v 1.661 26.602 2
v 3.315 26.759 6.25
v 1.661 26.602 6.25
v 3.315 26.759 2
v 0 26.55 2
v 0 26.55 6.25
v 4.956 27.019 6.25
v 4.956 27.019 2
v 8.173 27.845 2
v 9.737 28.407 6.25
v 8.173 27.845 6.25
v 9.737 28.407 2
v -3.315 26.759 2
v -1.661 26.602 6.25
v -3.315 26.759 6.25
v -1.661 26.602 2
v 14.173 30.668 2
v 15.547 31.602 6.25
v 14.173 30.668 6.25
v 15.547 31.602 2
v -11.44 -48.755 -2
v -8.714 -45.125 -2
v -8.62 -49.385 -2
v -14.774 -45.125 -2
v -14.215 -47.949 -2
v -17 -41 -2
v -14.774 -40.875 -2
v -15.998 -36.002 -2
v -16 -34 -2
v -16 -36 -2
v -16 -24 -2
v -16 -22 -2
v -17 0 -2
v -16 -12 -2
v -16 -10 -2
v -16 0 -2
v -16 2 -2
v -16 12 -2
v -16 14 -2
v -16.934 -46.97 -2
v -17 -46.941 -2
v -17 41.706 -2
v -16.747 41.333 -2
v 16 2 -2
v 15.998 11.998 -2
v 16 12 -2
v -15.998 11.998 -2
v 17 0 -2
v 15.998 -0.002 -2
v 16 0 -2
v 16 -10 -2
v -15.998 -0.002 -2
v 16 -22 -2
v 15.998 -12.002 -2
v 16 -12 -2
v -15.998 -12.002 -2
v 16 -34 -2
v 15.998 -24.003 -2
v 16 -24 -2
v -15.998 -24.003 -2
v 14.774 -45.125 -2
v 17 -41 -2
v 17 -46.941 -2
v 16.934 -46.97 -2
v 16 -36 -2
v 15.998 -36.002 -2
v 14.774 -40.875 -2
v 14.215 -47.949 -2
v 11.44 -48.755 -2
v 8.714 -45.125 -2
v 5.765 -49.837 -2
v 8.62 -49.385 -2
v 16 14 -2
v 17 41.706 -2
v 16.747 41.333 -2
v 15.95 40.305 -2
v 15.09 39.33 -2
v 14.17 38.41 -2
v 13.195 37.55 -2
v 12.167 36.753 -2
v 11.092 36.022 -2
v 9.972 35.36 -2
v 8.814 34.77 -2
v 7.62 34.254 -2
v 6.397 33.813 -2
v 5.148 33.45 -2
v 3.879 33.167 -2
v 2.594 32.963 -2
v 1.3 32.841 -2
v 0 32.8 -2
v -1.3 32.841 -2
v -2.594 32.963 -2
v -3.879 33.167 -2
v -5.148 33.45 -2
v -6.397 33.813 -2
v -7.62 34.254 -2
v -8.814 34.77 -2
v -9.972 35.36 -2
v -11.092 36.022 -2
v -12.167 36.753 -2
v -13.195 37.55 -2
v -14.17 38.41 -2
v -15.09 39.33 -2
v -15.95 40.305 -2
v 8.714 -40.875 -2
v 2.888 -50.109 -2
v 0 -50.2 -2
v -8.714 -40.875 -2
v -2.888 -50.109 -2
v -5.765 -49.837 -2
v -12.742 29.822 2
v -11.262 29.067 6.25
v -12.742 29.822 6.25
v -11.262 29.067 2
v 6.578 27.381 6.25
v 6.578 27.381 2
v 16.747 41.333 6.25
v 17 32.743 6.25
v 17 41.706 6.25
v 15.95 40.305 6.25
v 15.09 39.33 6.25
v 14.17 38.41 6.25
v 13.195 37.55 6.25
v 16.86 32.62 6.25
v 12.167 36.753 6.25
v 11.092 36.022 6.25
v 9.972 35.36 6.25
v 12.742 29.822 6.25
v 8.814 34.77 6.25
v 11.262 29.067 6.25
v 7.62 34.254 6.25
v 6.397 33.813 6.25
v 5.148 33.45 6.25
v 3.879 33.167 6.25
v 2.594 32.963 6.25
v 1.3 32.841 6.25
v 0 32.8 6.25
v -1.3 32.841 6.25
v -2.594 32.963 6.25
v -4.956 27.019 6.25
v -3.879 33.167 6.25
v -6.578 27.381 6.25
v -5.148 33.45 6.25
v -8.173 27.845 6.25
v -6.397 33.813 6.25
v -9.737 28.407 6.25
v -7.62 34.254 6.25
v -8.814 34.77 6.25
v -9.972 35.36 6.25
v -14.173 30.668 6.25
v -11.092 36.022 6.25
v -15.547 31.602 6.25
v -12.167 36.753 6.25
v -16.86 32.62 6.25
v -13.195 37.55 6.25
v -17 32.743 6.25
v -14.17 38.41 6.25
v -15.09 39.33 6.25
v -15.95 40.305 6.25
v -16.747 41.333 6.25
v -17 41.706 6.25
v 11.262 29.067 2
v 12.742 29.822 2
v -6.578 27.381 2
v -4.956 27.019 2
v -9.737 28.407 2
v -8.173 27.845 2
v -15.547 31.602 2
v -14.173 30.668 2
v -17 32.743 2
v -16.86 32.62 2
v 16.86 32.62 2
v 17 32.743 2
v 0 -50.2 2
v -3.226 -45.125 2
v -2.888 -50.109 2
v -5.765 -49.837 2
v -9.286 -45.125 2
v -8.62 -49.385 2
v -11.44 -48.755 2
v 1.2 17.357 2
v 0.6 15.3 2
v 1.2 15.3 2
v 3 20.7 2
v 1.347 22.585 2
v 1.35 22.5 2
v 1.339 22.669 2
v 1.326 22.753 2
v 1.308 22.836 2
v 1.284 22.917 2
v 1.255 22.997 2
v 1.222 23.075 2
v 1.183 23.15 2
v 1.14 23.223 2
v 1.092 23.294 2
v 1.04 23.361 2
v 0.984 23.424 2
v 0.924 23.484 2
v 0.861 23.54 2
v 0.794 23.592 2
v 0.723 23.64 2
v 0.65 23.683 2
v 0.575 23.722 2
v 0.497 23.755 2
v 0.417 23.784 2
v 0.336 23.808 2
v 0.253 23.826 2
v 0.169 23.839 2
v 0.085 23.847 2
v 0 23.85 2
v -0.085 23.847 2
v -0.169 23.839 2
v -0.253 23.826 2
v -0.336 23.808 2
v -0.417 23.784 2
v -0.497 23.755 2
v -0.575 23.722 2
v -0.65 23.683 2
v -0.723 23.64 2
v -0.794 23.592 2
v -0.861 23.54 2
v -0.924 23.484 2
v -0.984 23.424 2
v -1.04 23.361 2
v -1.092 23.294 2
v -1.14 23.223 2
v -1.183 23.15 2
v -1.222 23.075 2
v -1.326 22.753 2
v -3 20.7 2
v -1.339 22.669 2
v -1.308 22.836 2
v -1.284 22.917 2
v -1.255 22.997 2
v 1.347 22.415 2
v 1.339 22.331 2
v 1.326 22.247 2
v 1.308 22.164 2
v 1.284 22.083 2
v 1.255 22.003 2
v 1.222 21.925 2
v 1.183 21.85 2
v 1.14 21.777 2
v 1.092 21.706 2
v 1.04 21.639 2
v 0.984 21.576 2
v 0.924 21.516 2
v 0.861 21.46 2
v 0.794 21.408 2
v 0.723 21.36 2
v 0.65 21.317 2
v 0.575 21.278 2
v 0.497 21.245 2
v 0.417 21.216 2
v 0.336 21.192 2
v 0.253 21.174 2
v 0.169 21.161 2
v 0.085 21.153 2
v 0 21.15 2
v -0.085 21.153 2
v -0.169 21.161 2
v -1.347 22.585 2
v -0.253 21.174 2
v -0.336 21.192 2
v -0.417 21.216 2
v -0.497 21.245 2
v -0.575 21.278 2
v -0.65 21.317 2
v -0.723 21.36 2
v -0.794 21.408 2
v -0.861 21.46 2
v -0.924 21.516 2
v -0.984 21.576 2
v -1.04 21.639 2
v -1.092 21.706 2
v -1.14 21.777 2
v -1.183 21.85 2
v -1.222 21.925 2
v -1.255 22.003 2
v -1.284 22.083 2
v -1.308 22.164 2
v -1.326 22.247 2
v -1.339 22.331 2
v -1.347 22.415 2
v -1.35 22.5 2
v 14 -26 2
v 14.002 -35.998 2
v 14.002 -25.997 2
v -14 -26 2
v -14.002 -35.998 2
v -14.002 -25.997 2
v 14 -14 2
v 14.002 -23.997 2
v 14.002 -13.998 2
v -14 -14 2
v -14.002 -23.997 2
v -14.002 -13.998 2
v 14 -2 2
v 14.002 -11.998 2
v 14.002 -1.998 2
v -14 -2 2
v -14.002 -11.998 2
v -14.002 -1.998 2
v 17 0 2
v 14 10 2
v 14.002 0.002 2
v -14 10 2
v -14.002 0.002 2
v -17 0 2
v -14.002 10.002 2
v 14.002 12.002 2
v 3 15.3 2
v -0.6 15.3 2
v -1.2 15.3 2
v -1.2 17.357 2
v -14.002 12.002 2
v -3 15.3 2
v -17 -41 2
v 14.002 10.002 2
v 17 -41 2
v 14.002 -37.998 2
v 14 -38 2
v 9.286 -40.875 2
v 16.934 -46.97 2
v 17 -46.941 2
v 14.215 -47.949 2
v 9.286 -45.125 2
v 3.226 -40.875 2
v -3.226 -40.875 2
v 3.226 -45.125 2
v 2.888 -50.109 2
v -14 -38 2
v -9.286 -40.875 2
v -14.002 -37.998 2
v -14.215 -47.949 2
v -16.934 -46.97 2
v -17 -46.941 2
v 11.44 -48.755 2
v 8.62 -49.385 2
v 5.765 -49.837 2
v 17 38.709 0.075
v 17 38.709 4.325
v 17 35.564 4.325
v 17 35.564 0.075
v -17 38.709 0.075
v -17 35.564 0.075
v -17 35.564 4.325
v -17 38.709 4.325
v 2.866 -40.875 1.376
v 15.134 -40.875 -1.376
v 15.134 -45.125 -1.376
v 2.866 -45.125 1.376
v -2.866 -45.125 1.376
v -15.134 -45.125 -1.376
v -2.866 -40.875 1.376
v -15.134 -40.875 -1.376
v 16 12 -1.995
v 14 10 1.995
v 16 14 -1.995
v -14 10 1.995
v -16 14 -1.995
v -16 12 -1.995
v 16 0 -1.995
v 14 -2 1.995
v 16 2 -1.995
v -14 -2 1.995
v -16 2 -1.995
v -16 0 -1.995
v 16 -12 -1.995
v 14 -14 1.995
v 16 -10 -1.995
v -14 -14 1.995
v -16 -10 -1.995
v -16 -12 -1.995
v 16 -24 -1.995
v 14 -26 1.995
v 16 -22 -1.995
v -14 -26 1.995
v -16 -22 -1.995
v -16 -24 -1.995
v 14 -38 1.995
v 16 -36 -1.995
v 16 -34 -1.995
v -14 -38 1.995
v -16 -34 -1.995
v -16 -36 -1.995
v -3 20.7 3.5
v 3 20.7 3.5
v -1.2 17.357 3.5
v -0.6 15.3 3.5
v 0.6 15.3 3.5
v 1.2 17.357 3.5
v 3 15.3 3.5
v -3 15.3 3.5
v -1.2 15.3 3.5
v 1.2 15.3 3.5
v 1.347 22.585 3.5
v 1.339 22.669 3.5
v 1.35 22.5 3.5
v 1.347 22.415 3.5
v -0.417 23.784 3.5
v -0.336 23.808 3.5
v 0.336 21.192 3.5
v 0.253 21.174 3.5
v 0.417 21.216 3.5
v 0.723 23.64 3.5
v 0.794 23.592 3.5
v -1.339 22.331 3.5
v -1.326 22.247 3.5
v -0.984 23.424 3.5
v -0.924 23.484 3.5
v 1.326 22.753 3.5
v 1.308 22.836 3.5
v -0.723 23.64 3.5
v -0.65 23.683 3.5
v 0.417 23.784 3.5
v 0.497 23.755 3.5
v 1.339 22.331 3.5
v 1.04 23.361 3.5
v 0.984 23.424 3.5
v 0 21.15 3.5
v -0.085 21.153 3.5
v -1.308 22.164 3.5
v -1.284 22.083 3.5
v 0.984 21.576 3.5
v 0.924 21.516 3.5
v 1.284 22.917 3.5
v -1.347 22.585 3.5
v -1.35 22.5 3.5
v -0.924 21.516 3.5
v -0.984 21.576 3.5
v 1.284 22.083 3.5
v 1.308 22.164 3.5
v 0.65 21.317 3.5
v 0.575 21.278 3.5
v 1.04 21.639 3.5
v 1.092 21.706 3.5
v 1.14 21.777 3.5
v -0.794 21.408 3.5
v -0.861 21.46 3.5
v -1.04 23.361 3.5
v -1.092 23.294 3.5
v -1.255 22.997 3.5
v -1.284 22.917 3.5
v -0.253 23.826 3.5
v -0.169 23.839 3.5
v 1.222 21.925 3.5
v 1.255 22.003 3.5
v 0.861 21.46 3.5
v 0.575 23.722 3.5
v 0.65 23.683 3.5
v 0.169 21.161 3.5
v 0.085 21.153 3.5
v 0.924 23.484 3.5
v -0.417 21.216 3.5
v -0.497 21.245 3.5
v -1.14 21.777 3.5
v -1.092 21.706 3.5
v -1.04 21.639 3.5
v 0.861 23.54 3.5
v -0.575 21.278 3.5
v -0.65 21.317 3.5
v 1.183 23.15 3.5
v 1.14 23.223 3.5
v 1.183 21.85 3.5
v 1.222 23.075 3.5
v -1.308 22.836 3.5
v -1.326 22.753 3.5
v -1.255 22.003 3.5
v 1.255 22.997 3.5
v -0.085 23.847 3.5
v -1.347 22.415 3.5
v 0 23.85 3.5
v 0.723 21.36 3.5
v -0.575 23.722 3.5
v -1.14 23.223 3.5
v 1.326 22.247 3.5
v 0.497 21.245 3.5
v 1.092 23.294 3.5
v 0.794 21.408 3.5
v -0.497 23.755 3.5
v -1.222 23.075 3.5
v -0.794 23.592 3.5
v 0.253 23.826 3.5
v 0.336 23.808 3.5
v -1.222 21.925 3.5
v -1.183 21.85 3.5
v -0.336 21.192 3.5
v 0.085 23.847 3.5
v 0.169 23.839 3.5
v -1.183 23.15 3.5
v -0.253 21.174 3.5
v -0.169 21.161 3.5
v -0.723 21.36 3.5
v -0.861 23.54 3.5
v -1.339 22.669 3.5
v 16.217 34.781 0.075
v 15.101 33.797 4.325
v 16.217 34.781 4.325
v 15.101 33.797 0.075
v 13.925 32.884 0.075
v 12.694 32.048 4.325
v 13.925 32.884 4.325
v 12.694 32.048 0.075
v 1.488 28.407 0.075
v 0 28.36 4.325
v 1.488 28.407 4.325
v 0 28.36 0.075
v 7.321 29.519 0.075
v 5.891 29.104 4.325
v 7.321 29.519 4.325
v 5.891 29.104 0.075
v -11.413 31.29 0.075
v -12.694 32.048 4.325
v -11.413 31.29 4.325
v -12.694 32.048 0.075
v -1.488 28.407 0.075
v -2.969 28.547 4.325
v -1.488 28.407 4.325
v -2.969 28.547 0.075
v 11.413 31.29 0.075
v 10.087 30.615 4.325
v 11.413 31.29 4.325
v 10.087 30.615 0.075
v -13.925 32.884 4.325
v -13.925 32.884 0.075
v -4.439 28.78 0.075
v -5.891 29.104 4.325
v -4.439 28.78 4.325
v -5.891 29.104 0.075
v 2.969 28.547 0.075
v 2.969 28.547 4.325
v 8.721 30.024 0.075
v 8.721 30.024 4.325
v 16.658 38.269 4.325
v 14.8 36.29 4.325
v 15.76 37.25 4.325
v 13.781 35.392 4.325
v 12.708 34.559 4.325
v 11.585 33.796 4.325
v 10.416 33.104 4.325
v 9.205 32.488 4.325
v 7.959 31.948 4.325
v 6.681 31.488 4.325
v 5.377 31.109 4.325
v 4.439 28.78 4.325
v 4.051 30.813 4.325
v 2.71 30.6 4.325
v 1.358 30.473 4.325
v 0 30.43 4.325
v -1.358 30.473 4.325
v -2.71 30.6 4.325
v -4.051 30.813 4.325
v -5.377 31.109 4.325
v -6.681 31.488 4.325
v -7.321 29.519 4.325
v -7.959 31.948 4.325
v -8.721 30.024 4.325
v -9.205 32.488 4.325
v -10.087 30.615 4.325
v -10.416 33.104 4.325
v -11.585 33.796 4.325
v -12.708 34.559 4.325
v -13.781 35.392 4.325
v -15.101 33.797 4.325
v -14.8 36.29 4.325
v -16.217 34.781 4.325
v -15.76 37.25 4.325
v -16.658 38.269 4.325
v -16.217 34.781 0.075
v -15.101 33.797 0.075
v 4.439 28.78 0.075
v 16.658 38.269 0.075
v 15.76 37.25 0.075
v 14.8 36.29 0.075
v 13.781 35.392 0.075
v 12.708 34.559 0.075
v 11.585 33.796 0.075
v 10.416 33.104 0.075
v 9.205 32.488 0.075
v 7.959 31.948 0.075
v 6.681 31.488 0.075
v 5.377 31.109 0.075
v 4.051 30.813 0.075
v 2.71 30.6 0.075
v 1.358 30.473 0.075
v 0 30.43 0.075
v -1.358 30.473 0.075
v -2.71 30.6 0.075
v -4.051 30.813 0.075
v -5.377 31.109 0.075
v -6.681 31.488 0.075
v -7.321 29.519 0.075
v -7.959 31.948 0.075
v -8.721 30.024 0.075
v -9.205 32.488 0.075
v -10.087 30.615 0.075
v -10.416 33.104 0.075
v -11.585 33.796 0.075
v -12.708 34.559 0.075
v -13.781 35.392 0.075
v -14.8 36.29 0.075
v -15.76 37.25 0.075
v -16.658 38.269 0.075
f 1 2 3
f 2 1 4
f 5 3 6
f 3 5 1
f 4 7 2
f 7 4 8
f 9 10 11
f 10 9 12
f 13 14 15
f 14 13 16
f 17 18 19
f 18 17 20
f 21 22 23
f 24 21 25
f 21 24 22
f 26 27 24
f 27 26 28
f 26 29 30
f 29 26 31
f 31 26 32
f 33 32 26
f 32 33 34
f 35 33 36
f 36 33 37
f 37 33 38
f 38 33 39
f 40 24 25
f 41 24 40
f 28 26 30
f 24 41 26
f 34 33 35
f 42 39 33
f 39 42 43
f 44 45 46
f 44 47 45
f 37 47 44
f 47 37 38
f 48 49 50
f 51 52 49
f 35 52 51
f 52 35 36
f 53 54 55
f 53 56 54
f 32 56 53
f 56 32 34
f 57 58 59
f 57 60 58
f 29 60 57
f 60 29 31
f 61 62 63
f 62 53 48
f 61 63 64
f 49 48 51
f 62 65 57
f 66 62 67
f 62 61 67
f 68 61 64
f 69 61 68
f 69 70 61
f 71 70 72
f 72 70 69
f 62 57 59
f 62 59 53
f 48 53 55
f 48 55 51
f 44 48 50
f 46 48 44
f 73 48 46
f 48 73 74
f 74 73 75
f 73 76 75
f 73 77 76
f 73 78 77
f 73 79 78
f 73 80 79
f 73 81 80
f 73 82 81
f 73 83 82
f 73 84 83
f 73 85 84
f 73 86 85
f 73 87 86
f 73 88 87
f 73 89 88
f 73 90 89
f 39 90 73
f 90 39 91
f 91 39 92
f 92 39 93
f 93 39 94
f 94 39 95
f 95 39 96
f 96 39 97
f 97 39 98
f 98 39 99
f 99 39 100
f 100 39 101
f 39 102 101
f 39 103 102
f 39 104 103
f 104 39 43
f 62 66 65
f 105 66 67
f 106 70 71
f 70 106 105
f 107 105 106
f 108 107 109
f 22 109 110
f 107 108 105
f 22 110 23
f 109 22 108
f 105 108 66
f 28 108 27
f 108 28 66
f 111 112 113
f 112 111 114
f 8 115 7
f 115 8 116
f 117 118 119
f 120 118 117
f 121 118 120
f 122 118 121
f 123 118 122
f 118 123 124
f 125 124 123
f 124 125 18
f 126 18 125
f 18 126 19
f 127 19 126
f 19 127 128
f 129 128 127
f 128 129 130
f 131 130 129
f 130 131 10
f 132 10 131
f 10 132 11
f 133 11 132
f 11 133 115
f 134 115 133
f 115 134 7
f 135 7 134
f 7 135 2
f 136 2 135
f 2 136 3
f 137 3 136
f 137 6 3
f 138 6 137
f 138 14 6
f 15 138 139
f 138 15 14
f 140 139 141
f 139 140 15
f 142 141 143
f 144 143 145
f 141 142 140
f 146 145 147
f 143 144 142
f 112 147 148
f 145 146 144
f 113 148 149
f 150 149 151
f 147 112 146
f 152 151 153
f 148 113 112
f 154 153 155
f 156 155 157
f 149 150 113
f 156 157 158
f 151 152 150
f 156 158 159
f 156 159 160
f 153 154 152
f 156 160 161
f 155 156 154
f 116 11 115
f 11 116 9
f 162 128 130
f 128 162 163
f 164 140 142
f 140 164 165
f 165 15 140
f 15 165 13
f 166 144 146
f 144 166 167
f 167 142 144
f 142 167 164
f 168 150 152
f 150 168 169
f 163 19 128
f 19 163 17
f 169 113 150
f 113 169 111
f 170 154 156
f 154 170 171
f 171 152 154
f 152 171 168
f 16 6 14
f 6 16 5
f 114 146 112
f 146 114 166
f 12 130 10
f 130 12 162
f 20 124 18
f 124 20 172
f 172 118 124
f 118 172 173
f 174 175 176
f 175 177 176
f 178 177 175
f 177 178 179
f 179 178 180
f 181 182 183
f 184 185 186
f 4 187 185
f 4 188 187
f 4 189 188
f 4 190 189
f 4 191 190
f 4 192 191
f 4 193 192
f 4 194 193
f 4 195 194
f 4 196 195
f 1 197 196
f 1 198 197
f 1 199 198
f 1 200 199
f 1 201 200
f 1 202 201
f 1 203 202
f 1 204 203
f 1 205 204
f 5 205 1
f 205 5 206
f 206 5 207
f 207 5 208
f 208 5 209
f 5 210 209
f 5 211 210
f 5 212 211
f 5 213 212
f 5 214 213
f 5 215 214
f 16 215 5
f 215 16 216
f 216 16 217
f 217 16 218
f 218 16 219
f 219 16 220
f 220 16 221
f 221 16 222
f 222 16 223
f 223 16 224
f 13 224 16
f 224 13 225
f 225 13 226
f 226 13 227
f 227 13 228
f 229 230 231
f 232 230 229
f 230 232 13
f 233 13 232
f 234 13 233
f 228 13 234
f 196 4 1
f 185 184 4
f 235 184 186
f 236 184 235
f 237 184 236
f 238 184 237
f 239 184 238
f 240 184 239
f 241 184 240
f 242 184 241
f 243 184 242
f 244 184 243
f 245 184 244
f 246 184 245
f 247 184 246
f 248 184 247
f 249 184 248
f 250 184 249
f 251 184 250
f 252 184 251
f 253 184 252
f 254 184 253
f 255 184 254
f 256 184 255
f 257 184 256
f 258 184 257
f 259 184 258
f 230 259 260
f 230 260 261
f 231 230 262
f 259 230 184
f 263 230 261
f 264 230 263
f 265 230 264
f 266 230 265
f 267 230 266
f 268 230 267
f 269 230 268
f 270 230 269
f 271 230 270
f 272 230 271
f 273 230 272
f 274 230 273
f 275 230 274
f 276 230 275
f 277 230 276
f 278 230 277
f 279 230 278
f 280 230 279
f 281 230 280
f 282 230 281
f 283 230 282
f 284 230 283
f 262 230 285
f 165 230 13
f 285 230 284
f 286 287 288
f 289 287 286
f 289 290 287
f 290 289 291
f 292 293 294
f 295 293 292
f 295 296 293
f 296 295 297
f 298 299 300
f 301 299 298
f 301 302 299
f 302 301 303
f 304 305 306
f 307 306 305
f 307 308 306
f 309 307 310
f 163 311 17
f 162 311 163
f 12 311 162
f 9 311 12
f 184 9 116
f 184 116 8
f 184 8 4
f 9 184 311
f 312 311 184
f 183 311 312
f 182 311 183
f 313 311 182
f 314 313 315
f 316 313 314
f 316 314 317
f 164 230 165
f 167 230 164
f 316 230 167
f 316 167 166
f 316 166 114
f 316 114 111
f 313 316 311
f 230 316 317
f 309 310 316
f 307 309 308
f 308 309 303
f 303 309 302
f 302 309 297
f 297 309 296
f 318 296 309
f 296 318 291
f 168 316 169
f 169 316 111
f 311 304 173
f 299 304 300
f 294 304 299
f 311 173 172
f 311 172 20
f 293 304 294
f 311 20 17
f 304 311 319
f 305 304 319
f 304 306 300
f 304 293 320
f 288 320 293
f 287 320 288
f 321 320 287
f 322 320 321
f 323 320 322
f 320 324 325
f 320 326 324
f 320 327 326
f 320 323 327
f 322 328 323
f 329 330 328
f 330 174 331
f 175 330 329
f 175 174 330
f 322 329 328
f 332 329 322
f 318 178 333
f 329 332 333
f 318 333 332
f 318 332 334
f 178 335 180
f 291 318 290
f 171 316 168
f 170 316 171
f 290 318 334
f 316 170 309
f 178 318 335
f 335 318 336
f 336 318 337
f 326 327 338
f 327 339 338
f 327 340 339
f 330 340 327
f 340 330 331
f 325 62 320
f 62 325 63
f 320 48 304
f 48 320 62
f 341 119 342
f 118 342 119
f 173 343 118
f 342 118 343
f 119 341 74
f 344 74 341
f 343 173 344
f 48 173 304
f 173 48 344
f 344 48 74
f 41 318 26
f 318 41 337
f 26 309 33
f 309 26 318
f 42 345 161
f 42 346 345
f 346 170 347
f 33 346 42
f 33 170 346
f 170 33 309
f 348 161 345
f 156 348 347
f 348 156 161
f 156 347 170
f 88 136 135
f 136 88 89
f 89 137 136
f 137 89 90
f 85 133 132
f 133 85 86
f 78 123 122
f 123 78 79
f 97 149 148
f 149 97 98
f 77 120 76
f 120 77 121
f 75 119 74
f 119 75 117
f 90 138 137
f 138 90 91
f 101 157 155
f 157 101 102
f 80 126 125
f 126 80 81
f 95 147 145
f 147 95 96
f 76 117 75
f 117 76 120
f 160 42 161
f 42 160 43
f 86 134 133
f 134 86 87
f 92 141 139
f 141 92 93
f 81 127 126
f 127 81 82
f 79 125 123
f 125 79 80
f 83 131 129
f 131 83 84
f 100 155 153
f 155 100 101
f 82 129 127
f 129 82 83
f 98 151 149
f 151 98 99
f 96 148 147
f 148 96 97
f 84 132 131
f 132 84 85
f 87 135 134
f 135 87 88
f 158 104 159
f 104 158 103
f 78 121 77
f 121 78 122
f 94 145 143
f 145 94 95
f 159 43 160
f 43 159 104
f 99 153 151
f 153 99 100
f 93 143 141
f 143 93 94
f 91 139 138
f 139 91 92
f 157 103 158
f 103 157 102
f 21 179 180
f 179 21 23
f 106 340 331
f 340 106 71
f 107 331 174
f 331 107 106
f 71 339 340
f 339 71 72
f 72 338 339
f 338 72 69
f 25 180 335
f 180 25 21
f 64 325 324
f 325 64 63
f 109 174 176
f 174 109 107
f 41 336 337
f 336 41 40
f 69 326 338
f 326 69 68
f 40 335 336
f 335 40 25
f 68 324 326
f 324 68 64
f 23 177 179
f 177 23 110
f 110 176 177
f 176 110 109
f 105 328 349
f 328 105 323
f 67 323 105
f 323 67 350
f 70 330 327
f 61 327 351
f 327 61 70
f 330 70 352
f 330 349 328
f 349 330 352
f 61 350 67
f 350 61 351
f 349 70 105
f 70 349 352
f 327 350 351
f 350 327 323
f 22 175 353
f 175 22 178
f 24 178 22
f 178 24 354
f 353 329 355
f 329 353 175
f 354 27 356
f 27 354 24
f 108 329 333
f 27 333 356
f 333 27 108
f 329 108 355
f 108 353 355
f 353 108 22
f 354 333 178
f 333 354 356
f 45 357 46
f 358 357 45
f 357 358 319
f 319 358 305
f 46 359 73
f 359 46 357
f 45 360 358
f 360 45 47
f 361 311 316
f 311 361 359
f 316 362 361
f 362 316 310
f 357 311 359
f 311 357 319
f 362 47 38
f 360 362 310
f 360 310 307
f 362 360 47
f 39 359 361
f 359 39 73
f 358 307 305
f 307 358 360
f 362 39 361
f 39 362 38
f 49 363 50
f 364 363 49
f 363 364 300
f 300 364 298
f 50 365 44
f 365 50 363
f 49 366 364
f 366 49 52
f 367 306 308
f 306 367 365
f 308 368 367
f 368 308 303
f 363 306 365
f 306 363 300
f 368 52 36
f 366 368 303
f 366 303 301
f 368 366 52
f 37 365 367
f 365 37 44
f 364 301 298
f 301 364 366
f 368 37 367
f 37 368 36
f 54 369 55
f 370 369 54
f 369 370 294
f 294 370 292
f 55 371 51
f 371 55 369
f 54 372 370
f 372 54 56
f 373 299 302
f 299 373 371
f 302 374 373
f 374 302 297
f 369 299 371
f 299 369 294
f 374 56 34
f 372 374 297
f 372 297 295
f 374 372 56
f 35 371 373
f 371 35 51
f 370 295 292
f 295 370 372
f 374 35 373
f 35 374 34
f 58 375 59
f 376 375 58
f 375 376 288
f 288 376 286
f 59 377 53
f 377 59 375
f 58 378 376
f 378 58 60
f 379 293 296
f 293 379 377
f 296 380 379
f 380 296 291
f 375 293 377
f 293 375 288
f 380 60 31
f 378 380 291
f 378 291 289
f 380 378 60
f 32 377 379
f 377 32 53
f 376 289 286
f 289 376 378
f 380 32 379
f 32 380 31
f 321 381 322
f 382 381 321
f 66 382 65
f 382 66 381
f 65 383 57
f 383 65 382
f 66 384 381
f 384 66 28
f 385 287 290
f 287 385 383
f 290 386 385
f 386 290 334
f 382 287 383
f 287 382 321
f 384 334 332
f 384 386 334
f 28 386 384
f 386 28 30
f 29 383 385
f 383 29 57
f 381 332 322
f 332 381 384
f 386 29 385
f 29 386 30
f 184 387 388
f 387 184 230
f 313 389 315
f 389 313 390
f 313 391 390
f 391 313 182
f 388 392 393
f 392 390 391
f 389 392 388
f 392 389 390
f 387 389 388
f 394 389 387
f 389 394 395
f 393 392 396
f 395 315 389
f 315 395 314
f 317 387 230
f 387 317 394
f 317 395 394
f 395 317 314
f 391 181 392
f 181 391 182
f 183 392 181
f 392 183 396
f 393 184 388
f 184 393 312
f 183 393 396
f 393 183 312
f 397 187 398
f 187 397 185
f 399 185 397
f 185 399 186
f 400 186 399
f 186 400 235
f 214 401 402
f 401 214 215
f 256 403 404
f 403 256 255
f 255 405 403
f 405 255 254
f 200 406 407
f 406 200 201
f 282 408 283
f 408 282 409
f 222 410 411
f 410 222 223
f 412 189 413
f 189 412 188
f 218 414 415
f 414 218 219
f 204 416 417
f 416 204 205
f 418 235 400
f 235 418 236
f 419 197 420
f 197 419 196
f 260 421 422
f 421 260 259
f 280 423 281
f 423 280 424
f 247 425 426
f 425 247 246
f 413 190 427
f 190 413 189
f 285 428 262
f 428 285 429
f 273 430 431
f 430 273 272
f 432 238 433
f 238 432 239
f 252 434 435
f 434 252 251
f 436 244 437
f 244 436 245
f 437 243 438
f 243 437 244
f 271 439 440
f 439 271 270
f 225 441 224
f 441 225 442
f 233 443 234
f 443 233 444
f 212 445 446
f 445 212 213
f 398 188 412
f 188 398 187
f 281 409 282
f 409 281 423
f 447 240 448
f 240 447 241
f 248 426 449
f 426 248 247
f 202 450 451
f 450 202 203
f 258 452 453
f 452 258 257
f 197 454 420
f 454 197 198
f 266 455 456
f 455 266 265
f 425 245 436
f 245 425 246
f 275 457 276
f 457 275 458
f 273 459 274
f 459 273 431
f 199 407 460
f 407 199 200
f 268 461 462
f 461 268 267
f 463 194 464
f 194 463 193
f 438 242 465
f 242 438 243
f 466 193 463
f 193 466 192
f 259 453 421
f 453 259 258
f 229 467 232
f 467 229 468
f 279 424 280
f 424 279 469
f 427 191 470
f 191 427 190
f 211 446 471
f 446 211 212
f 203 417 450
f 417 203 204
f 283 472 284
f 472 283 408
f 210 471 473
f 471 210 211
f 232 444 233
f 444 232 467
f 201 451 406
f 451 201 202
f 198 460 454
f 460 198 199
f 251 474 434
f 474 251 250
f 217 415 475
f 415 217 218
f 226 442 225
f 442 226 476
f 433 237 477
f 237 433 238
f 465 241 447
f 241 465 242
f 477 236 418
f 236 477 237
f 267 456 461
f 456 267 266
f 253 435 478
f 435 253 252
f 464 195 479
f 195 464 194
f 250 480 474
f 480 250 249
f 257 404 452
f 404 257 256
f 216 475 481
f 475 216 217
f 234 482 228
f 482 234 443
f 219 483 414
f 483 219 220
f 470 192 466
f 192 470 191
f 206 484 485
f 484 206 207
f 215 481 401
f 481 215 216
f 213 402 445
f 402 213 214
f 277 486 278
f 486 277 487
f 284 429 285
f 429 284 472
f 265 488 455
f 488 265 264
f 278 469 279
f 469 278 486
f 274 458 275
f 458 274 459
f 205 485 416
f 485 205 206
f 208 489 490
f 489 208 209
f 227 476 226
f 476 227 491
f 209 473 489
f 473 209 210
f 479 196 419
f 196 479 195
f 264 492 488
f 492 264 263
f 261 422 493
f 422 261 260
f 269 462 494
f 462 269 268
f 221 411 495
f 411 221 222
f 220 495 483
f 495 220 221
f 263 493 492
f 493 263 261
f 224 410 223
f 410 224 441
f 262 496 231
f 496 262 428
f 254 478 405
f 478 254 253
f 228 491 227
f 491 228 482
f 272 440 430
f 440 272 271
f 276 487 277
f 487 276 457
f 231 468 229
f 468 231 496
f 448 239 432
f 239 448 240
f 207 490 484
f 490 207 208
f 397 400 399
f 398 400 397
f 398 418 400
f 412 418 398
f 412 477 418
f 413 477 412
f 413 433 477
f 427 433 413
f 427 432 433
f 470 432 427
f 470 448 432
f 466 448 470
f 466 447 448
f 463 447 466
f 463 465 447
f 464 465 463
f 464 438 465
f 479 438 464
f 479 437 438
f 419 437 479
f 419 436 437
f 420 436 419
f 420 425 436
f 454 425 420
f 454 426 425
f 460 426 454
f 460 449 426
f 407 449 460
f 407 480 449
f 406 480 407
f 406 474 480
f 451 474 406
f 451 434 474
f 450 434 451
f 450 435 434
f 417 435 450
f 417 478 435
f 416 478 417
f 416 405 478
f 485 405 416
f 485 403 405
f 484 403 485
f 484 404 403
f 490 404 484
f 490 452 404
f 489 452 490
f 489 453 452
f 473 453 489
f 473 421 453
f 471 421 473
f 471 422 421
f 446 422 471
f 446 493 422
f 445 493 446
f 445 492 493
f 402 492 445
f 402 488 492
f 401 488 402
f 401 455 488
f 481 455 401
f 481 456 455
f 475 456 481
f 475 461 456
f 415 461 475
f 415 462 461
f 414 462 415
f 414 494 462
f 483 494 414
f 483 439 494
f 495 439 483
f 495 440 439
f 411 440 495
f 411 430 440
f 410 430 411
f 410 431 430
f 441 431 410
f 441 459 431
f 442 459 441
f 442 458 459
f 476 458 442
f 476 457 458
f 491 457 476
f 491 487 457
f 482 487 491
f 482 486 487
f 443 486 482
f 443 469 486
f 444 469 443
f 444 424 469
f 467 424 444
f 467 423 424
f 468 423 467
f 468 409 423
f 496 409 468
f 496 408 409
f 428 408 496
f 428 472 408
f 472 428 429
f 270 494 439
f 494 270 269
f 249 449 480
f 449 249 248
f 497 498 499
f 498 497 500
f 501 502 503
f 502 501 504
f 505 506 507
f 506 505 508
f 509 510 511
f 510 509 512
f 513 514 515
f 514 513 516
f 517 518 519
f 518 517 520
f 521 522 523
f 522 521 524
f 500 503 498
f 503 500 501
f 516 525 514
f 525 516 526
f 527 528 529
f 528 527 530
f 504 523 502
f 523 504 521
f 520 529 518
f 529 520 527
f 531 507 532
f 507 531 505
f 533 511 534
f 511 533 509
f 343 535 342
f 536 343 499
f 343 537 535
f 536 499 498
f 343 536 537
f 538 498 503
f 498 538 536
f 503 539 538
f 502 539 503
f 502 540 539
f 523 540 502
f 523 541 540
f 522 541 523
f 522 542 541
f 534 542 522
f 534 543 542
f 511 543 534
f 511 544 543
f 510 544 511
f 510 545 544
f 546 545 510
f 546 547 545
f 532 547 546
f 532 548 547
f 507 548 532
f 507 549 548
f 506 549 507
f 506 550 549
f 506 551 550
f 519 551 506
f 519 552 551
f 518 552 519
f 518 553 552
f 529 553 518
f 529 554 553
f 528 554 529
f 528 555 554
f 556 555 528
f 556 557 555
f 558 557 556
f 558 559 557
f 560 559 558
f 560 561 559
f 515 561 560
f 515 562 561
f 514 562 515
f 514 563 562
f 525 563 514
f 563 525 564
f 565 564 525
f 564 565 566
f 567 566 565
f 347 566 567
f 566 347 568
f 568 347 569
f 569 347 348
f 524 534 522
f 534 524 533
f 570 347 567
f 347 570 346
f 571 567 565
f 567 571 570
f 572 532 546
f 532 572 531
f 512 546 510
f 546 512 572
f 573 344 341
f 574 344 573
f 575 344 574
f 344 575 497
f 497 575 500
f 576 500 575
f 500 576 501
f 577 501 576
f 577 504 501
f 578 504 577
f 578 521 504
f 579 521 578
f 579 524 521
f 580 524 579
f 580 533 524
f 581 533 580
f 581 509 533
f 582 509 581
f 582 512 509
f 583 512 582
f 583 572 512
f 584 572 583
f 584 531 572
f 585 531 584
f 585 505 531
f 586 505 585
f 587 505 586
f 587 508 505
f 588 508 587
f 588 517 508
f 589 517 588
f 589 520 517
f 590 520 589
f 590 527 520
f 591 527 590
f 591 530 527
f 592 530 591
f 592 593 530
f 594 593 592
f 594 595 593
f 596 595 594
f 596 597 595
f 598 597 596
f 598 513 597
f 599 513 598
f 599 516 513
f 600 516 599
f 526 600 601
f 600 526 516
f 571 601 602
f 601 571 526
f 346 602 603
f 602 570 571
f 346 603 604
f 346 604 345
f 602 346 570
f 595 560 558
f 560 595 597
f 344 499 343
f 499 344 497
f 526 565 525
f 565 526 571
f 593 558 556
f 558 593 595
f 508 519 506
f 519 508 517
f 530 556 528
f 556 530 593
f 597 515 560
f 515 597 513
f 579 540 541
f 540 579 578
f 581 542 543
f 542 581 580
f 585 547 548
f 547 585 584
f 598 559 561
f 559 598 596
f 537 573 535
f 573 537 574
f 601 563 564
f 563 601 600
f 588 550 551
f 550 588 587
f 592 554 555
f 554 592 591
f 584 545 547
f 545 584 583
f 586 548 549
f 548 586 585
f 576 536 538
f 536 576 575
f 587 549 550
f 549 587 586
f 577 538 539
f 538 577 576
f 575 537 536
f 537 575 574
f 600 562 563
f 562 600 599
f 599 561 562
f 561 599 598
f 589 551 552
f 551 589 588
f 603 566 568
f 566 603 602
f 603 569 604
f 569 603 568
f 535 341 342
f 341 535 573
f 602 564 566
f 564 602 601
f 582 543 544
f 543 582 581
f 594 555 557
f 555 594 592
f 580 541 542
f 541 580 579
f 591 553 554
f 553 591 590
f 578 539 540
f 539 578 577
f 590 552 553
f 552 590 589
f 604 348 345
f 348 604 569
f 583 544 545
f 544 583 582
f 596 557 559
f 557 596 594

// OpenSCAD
$fn = 100;

// number of GU slots
gels = 5; // [5:12]
gel_width = 32 / 1;
gel_cut_width = 28 / 1;
gel_opening = 2 / 1;
gel_spacing = 10 / 1;

ladder_margin = 16 / 1;
ladder_length = gel_opening * gels + gel_spacing * (gels - 1) + ladder_margin * 2;
ladder_width = gel_width + gel_opening;
ladder_thickness = 4 / 1;
ladder_round = 1 / 1;

// diameter of front stem
stem_diameter = 46; // [44:50]
stem_radius = stem_diameter / 2;

zip_thickness = 1.5 / 1;
zip_width = 3.75 / 1;
zip_height = 4.25 / 1;

logo_head = 10 / 1;
logo_m_thick = 6 / 1;
logo_m_thin = 4 / 1;

// show logo (just for fun)
logo = "yes"; // [yes, no]

// add slot for second zip tie (recommended)
second_zip_tie = "yes"; // [yes, no]

module slot() {
    translate([0, 0, -(ladder_thickness / 2)]) {
        hull() {
            cube([gel_opening, gel_width, 0.01], true);
            translate([gel_opening, 0, ladder_thickness]) {
                cube([gel_opening, gel_cut_width, 0.01], true);
            }
        }
    }
}

module ladder() {
    difference() {
        union() {
            // initial ladder
            cube([ladder_length, ladder_width, ladder_thickness], true);
            
            // add on the front ring for the zip tie, make it a half ring
            translate([-ladder_length / 2 - ladder_margin * .75, 0, zip_height / 2]) {
                    difference() {
                        cylinder(ladder_thickness + zip_height, stem_radius * 1.15, stem_radius * 1.15, true);
                        translate([-stem_radius, 0, 0]) {
                            cube([stem_diameter, stem_diameter, stem_diameter], true);
                        }
                    }
            }        
        }
        
        translate([-(ladder_length / 2) - zip_thickness * 3 - ladder_margin * .75 + 4, 0, 0]) {
                cylinder(ladder_thickness * 5, stem_radius * .9, stem_radius * .9, true);
        }

        
         // remove sides
        translate([-ladder_length, ladder_width, 0]) {
            cube([ladder_length * 2, ladder_width, ladder_thickness * 5], true);
        }

        translate([-ladder_length, -ladder_width, 0]) {
            cube([ladder_length * 2, ladder_width, ladder_thickness * 5], true);
        }  
        

    }
    

    // round off the end of the ladder
    difference() {
        translate([ladder_length / 2 - stem_diameter * .8, 0, 0]) {
            cylinder(ladder_thickness, stem_diameter, stem_diameter, true);
        }
        translate([0, ladder_width, 0]) {
            cube([ladder_length * 10, ladder_width, ladder_thickness + .1], true);
        }
        translate([0, -ladder_width, 0]) {
            cube([ladder_length * 10, ladder_width, ladder_thickness + .1], true);
        }

        translate([-ladder_width, 0, 0]) {
                cube([ladder_width, ladder_width, ladder_width], true);
        }        
    }

}

module stemzip() {
    difference() {
        cylinder(zip_height, stem_radius * 1.03, stem_radius * 1.03, true);
        scale([.94, .94, .94 ]) {
            cylinder(zip_height * 2, stem_radius, stem_radius, true);
        }
    }
}


// showtime!
module main() {
    difference() {
        ladder();
        translate([-(ladder_length / 2 + stem_radius + ladder_margin) + zip_height - zip_thickness, 0, zip_height / 2]) {
            stemzip();
        }    
        for (offset = [0: gels]) {
            translate([(gel_opening + gel_spacing) * offset - ladder_length / 2 + ladder_margin * 1.75, 0, 0]) {
                if (offset < gels) {
                    slot();
                }
                
                if (second_zip_tie == "yes") {
                    if (offset == gels) {
                        translate([- (gel_spacing / 2) + 1, ladder_width / 2 - 8, 0]) {
                            rotate([60, 0, 0]) {
                                cube([zip_height, zip_width, ladder_thickness * 3], true);
                            }
                        }
                        translate([- (gel_spacing / 2) + 1, -ladder_width / 2 + 8, 0]) {
                            rotate([-60, 0, 0]) {
                                cube([zip_height, zip_width, ladder_thickness * 3], true);
                            }
                        }
                    }
                }
                
            }

        }
    }
}

module logo_half() {
    translate([0, -(logo_m_thick / 2 + 6), 0]) {    
        hull() {
            
            translate([-(logo_m_thick * 1), 4.5, 0]) {
                cube([logo_m_thick, logo_m_thick, logo_head], true);
            }
         
            translate([logo_m_thick + (logo_m_thick - logo_m_thin) / 2, 7, 0]) {
                cube([logo_m_thin, logo_m_thin, logo_head], true) {
                }
            }
        }
        translate([-(logo_m_thick * 1), 0, 0]) {
            cube([logo_m_thick, logo_m_thick, logo_head], true);
        }
        
        translate([0, 0, 0]) {
            cube([logo_m_thick * 3, logo_m_thick, logo_head], true);
        }
    }
}

module logo() {
    translate([0, logo_m_thick * 3 - 3, 0]) {
        cylinder(logo_head, 4.5, 4.5, true);
    }
    rotate([0, 0, -90]) {
        translate([0, logo_m_thin / 2, 0]) {
            logo_half();
        }
        translate([0, -(logo_m_thin / 2), 0]) {
            mirror([0, 1, 0]) {
                logo_half();
            }
        }
    }
}




difference() {
    union() {
        rotate([0, 0, -90]) {
            main();
        }

        if (logo == "yes") {
            // add the logo
            translate([0, ladder_length / 2 - ladder_margin - gel_spacing + 3, 2]) {
                scale([.3, .3, .3]) {
                    logo();
                }
            }
        }
    }



    translate([0, ladder_length / 2 + ladder_margin - zip_thickness * 3.3, ladder_thickness / 2 + .2]) {
        stemzip();
    }
}
